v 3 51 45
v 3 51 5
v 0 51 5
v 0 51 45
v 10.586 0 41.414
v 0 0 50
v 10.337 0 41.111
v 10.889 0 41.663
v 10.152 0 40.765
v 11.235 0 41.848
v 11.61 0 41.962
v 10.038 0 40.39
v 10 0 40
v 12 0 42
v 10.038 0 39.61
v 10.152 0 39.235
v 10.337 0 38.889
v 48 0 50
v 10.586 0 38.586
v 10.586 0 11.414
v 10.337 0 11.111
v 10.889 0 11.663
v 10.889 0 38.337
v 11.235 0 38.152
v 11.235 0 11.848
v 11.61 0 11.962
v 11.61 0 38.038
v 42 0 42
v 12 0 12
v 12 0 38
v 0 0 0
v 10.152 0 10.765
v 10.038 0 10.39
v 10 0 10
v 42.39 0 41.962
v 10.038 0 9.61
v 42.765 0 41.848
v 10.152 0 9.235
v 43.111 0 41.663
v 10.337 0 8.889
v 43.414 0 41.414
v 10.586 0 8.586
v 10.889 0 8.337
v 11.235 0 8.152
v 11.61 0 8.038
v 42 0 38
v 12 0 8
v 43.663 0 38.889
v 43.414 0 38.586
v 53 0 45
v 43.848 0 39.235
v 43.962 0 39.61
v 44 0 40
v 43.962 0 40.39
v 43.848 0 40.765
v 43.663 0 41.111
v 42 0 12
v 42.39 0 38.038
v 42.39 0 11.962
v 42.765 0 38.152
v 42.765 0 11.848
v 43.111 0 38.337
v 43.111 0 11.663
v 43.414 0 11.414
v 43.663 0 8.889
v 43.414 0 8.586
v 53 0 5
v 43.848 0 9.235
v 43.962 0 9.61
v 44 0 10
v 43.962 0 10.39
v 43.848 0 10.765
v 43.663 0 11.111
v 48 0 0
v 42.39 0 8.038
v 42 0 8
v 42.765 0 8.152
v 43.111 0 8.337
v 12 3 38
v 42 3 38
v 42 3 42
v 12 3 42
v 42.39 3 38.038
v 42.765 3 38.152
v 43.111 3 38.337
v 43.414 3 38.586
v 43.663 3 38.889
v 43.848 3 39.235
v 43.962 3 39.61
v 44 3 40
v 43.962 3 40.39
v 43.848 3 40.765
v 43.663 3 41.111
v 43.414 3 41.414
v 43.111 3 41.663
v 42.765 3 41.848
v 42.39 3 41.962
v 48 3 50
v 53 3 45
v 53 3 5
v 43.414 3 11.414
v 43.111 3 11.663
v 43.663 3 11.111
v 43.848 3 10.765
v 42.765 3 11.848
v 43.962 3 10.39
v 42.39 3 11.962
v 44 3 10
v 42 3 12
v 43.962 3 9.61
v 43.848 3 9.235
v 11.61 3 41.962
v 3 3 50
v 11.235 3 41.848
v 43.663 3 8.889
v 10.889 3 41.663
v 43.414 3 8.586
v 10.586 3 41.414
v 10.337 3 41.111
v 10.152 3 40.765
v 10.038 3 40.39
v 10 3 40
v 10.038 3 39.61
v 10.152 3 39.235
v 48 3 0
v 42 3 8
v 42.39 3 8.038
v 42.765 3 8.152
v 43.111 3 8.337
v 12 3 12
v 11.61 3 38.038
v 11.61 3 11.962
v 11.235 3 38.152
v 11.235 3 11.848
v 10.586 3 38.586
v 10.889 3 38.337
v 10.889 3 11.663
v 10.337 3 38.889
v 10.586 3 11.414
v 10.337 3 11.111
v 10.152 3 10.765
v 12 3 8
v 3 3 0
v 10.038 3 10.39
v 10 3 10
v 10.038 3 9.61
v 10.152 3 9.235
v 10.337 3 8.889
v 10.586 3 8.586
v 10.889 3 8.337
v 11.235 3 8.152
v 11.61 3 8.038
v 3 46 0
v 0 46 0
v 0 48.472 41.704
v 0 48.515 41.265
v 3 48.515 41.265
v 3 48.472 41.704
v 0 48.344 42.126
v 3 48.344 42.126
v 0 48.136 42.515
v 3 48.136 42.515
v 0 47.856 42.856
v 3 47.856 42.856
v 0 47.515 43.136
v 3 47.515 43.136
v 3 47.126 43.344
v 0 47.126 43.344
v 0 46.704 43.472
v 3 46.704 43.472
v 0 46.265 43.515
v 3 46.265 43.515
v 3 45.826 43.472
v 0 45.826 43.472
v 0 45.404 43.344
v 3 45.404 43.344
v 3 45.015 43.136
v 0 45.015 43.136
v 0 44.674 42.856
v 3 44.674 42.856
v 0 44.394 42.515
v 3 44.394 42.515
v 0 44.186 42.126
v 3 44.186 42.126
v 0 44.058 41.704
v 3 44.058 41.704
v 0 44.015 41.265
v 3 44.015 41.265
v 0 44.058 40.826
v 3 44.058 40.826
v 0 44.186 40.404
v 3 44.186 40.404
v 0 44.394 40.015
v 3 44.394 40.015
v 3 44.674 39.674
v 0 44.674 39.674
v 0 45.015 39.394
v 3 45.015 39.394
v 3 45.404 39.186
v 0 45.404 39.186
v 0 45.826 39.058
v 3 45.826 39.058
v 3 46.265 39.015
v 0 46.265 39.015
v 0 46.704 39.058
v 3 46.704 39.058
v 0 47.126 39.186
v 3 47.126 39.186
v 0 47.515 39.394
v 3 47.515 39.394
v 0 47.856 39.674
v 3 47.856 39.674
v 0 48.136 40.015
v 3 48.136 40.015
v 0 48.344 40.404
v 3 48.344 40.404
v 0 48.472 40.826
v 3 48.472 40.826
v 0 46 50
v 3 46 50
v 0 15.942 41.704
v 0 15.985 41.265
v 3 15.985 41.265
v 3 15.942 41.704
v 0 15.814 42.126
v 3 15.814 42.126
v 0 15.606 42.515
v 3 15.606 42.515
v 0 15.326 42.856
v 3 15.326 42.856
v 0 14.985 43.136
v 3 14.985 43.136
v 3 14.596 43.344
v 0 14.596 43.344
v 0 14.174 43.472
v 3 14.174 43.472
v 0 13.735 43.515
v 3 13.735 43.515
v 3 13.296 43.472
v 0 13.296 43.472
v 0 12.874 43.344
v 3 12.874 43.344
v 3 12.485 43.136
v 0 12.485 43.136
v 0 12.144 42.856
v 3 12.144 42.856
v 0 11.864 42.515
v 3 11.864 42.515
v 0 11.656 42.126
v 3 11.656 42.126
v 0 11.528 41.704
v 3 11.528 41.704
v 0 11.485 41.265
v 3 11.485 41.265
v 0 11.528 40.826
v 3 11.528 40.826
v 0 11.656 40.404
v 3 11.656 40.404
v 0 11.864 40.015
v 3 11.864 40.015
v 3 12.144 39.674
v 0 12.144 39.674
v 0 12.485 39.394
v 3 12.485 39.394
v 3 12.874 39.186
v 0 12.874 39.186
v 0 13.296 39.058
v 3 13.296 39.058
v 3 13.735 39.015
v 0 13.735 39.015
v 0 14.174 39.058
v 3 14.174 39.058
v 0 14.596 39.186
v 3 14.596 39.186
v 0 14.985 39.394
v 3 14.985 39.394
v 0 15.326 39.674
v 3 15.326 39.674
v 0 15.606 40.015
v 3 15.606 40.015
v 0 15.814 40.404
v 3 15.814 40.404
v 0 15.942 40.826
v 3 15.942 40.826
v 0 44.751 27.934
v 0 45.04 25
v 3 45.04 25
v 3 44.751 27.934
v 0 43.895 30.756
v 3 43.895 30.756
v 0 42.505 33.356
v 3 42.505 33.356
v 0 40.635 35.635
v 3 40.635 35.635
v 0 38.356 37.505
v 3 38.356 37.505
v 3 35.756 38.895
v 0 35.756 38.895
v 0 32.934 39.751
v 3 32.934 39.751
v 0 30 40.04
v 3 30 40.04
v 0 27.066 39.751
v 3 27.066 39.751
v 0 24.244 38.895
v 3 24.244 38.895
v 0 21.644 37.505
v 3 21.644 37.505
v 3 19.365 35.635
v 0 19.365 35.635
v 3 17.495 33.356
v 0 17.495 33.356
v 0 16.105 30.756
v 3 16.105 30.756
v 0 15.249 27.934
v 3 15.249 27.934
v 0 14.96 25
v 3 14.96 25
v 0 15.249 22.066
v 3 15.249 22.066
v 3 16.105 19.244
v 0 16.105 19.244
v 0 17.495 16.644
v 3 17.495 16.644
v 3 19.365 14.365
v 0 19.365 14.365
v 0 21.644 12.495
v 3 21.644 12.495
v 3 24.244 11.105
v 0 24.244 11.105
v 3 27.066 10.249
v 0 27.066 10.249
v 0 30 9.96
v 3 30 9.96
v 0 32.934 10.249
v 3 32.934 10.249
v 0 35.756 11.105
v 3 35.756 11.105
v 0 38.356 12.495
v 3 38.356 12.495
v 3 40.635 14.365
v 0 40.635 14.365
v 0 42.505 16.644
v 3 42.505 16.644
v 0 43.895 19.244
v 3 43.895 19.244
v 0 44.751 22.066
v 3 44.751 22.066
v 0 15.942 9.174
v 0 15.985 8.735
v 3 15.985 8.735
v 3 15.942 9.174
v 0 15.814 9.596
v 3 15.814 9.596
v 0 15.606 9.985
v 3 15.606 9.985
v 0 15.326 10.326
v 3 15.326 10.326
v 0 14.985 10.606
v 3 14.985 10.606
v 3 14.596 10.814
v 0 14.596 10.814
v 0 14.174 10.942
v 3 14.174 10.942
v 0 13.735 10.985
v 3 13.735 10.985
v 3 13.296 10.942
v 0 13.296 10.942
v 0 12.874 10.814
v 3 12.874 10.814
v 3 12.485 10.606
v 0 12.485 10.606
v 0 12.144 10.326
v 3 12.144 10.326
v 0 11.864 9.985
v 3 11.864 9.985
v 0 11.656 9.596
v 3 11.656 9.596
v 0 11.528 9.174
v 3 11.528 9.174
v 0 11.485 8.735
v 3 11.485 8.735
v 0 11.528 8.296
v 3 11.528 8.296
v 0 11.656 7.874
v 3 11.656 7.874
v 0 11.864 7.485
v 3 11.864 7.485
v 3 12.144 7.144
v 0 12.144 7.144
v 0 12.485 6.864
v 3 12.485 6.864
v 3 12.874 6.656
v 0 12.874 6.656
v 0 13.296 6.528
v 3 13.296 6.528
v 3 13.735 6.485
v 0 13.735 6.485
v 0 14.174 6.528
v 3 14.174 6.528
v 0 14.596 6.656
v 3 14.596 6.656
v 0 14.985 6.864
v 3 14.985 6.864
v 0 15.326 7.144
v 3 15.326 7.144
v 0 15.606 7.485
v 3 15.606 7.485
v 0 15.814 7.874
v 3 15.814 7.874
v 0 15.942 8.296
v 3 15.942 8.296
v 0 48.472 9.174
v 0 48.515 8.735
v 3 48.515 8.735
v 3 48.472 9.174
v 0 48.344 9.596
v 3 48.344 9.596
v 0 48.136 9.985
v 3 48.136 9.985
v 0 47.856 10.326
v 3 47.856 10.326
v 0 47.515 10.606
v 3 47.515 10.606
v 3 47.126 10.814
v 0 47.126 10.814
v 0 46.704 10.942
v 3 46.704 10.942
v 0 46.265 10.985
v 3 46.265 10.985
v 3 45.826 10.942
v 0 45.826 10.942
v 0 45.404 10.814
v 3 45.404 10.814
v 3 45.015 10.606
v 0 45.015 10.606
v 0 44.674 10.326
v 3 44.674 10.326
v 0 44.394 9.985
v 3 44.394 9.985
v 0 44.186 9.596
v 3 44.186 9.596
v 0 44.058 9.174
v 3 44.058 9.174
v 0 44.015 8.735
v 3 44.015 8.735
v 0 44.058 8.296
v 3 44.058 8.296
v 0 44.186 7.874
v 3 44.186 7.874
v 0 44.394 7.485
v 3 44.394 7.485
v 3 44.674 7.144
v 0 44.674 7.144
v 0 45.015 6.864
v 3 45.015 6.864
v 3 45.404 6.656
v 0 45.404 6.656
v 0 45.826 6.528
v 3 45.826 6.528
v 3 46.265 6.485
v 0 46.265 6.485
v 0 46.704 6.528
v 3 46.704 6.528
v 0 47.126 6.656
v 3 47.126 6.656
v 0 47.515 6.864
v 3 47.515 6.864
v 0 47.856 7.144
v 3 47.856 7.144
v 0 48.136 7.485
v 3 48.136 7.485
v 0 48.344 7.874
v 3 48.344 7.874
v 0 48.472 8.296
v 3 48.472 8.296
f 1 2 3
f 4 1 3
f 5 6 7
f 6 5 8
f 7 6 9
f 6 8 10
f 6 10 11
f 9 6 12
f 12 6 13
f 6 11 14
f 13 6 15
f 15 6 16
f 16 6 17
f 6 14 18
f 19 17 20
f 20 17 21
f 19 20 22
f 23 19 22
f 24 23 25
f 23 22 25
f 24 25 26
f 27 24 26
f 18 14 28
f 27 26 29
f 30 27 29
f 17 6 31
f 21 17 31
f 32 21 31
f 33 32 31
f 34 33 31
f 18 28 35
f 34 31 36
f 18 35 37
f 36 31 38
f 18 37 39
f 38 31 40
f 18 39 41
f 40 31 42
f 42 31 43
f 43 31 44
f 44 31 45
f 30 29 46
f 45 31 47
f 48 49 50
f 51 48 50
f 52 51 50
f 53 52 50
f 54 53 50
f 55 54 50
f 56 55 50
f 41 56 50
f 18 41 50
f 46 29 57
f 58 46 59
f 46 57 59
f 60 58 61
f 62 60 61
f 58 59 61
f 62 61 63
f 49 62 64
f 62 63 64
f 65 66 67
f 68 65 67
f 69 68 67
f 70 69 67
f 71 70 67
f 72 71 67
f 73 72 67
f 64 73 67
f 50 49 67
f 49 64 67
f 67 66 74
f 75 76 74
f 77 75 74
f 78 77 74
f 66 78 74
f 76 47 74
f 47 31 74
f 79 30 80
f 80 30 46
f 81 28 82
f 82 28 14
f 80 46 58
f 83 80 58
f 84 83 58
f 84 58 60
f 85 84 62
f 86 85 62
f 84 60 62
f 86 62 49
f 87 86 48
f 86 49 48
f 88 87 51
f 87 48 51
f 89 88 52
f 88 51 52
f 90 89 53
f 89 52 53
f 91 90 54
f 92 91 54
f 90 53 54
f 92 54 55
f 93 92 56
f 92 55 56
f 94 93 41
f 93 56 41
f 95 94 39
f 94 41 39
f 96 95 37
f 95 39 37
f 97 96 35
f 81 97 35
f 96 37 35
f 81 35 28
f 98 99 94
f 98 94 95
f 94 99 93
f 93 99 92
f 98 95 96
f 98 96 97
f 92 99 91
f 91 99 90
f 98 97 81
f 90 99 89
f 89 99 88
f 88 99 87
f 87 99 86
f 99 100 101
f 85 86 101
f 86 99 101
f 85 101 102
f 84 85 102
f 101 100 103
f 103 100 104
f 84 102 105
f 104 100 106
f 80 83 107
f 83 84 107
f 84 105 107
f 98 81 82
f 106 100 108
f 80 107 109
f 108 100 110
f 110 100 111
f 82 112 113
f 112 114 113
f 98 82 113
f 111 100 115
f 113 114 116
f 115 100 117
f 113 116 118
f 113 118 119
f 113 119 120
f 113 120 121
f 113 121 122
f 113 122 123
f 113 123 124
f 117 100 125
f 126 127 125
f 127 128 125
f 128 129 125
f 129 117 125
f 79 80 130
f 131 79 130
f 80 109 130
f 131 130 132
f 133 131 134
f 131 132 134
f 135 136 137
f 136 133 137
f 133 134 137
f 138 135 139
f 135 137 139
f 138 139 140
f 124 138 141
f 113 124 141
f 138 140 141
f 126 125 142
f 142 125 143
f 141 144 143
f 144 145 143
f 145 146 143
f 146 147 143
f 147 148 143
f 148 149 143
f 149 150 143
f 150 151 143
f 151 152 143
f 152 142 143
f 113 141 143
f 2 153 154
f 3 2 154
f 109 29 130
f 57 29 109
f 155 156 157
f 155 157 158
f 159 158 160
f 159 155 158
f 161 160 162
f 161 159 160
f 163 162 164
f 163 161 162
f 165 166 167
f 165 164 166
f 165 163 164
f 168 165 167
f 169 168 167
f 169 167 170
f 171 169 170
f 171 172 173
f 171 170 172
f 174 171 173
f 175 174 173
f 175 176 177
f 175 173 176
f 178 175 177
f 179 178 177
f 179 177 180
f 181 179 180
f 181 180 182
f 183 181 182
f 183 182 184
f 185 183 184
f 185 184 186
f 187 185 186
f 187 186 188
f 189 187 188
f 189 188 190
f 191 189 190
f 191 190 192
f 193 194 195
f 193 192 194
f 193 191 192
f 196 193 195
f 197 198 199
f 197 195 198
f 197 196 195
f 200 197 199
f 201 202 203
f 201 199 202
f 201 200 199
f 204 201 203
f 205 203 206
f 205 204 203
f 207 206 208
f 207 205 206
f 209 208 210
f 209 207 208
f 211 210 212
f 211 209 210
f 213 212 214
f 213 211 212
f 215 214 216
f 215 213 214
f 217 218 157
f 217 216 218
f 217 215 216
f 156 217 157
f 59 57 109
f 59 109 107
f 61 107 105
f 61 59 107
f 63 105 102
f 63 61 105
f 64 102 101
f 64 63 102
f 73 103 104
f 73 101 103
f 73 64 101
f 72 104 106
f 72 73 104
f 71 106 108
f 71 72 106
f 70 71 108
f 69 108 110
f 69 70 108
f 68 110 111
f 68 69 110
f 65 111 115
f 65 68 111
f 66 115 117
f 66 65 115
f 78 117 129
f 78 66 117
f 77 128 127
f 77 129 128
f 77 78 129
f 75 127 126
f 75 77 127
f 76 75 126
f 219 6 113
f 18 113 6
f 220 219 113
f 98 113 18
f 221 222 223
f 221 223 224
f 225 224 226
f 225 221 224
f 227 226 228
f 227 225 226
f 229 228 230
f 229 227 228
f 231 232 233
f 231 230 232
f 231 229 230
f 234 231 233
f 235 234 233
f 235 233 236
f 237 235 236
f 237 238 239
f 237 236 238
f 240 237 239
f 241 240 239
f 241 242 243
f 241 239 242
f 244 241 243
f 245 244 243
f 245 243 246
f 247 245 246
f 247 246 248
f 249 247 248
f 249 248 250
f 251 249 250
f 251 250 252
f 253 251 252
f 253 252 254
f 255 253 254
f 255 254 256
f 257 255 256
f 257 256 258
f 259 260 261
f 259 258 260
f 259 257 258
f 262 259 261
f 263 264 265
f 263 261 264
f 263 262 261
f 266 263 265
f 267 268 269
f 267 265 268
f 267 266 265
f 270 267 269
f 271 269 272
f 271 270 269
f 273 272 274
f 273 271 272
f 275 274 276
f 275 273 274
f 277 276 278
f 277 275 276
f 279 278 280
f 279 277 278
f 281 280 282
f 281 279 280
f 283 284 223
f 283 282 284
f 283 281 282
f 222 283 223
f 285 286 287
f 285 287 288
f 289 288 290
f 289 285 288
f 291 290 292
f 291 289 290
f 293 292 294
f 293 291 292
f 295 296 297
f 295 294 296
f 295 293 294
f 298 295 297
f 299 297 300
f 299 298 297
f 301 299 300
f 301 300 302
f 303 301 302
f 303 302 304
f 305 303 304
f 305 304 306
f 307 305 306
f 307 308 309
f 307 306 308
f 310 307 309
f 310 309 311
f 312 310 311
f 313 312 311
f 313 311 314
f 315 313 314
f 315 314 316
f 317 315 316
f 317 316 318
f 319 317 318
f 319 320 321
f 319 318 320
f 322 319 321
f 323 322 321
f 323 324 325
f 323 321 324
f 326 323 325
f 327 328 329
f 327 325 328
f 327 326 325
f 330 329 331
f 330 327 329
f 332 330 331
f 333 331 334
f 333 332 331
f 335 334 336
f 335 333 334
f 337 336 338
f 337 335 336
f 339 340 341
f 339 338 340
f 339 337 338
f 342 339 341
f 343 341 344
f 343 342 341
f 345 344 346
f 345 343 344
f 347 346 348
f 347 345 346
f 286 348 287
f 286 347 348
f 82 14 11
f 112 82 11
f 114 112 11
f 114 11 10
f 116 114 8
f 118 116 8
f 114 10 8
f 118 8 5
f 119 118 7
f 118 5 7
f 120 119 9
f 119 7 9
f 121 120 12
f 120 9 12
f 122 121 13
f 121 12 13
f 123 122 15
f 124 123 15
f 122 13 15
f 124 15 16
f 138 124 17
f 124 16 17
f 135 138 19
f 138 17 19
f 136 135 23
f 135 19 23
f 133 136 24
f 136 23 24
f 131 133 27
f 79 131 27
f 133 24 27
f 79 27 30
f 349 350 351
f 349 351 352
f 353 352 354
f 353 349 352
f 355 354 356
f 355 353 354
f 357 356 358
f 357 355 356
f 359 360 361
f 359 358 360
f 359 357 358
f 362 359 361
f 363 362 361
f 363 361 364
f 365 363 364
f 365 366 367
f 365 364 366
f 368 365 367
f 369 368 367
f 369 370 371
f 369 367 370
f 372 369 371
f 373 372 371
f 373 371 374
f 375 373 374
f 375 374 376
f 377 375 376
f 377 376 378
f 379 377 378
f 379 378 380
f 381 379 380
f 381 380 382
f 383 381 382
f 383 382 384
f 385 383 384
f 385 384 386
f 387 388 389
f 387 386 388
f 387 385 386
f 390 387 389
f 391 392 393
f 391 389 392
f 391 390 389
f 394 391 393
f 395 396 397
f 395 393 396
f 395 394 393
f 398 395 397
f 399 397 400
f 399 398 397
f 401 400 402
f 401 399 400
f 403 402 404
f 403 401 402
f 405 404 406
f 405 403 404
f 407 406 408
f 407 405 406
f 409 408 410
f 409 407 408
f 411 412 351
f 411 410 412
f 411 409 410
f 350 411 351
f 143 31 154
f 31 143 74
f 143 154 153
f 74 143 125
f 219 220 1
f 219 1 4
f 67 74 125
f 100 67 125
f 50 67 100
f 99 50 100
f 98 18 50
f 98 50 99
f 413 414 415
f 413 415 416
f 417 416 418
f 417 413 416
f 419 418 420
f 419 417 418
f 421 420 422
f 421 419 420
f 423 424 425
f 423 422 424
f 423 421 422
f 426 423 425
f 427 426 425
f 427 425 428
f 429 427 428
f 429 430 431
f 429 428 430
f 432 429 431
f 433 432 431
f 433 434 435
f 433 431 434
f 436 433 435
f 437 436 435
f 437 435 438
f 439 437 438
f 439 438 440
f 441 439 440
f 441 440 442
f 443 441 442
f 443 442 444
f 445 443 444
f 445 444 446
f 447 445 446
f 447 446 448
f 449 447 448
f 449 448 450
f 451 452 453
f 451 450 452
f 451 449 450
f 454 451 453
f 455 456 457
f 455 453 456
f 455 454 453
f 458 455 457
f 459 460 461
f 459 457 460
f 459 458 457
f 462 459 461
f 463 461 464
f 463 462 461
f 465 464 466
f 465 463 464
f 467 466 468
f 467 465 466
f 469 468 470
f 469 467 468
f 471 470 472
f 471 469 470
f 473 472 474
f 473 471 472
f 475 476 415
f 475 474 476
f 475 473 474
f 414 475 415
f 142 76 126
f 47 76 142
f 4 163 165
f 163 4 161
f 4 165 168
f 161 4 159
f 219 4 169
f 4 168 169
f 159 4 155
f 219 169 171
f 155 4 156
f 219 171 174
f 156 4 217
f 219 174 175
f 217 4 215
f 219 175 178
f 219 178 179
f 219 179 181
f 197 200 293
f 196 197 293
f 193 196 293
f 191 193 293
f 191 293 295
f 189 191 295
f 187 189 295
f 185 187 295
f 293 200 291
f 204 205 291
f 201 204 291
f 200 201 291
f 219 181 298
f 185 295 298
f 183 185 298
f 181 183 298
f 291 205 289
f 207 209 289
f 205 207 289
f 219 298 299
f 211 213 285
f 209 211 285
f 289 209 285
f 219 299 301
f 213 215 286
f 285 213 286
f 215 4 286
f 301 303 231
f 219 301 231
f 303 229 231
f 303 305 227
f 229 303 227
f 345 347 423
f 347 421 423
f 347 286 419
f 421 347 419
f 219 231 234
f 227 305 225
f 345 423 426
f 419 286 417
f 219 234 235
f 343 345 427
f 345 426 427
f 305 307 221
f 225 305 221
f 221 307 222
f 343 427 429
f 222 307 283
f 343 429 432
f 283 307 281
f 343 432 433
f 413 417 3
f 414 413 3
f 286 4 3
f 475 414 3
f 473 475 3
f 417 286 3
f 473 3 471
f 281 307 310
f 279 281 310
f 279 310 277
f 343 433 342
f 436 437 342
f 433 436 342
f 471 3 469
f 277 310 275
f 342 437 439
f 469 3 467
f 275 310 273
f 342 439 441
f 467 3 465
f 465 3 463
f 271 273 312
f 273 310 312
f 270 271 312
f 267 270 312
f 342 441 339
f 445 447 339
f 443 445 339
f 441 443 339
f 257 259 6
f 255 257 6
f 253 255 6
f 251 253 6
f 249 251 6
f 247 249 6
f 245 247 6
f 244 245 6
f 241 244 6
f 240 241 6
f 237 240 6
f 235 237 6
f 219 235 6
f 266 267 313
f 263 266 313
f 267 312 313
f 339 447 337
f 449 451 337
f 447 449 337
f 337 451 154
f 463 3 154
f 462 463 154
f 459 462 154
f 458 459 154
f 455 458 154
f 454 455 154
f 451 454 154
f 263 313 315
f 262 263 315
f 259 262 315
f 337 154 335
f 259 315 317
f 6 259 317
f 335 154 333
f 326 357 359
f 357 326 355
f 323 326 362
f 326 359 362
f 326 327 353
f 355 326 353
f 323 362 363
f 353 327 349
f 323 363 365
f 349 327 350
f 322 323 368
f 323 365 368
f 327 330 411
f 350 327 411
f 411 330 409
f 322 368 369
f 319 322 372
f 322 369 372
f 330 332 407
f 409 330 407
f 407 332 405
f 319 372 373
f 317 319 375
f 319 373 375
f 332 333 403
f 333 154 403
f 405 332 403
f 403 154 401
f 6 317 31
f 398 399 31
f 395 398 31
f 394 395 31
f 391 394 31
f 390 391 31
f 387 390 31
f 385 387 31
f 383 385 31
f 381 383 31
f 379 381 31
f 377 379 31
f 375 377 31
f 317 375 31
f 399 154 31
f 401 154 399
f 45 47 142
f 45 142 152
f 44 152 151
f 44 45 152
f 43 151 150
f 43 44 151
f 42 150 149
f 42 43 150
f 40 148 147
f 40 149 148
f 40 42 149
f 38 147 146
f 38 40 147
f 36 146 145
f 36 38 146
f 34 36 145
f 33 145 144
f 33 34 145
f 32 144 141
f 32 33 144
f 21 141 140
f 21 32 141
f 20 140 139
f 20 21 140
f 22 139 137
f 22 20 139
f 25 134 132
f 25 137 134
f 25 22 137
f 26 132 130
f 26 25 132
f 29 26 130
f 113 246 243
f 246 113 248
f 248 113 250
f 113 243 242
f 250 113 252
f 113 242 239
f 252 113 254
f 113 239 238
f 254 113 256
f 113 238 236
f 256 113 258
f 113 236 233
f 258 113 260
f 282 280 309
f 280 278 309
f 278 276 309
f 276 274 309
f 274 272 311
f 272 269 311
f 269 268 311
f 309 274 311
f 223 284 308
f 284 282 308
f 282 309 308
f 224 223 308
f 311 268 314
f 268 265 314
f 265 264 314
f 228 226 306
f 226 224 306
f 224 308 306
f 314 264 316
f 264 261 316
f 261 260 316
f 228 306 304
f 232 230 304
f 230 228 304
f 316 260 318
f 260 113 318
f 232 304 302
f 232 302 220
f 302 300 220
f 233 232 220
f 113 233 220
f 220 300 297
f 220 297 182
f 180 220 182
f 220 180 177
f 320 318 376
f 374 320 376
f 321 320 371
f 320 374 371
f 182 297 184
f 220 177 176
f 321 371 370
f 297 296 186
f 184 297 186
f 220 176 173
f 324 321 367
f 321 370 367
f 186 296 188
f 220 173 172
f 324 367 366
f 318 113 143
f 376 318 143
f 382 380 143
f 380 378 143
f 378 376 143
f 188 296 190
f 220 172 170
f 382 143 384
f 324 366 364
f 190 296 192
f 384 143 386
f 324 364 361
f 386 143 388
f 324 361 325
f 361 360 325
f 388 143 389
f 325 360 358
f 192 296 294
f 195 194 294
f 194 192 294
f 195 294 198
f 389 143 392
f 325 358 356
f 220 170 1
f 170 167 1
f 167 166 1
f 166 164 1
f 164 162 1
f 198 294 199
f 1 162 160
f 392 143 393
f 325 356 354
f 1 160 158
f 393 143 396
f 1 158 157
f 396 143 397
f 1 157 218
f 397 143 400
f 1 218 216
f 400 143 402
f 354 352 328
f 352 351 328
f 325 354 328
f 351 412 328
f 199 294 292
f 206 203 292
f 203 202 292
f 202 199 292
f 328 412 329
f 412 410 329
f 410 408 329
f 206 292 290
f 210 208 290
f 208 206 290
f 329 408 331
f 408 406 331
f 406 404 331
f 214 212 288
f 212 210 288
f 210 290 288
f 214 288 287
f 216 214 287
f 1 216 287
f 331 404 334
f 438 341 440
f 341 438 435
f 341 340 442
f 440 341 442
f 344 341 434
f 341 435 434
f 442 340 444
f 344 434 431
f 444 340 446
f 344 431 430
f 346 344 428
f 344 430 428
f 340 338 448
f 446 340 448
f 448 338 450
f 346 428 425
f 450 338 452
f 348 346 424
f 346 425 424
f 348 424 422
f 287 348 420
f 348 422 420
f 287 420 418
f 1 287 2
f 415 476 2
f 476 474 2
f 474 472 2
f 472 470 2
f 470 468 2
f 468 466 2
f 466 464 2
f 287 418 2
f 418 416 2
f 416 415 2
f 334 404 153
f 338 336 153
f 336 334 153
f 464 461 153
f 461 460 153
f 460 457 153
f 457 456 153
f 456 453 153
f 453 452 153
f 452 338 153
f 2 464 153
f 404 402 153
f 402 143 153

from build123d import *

# Parameters (mm, degrees)
EXTRUDE_1_DEPTH          = 50
CHAMFER_1_SIZE           = 5
CUT_EXTRUDE_1_DEPTH      = 88.183714076
CUT_EXTRUDE_1_DEPTH_BACK = 88.183714076
SKETCH_2_R               = 15.04
SKETCH_2_R_2             = 2.25
CUT_EXTRUDE_2_DEPTH      = 88.252507127
CUT_EXTRUDE_2_DEPTH_BACK = 88.252507127


with BuildPart() as part:
    # 草图1 → 凸台-拉伸1 (new body)
    with BuildSketch(Plane.XY):
        Polygon((0, 0), (53, 0), (53, 3), (3, 3), (3, 51), (0, 51), align=None)
    extrude(amount=EXTRUDE_1_DEPTH)

    # 倒角1
    chamfer_1_edges = [part.edges().sort_by_distance(p)[0] for p in [
        (53, 1.5, 50),
        (1.5, 51, 50),
        (1.5, 51, 0),
        (53, 1.5, 0),
    ]]
    chamfer(chamfer_1_edges, length=CHAMFER_1_SIZE)

    # 草图2 → 切除-拉伸1 (cut, two sides: drawn at the far end of the back side and taken through both)
    with BuildSketch(Plane(origin=(3, 0, 0), x_dir=(0, 0, -1), z_dir=(1, 0, 0)).offset(-CUT_EXTRUDE_1_DEPTH_BACK)):
        with Locations(Location((-25, 30, 0), (0, 0, 90))):
            Circle(SKETCH_2_R)
        with Locations(Location((-8.735, 46.265, 0), (0, 0, 90))):
            Circle(SKETCH_2_R_2)
        with Locations(Location((-41.265, 46.265, 0), (0, 0, 90))):
            Circle(SKETCH_2_R_2)
        with Locations(Location((-8.735, 13.735, 0), (0, 0, 90))):
            Circle(SKETCH_2_R_2)
        with Locations(Location((-41.265, 13.735, 0), (0, 0, 90))):
            Circle(SKETCH_2_R_2)
    extrude(amount=CUT_EXTRUDE_1_DEPTH + CUT_EXTRUDE_1_DEPTH_BACK, mode=Mode.SUBTRACT)

    # 草图4 → 切除-拉伸2 (cut, two sides: drawn at the far end of the back side and taken through both)
    with BuildSketch(Plane(origin=(0, 3, 0), x_dir=(1, 0, 0), z_dir=(0, 1, 0)).offset(-CUT_EXTRUDE_2_DEPTH_BACK)):
        with BuildLine():
            Line((12, -12), (42, -12))
            ThreePointArc((42, -12), (44, -10), (42, -8))
            Line((42, -8), (12, -8))
            ThreePointArc((12, -8), (10, -10), (12, -12))
        make_face()
        with BuildLine():
            Line((12, -38), (42, -38))
            ThreePointArc((42, -38), (44, -40), (42, -42))
            Line((42, -42), (12, -42))
            ThreePointArc((12, -42), (10, -40), (12, -38))
        make_face()
    extrude(amount=CUT_EXTRUDE_2_DEPTH + CUT_EXTRUDE_2_DEPTH_BACK, mode=Mode.SUBTRACT)


solid = part.part
